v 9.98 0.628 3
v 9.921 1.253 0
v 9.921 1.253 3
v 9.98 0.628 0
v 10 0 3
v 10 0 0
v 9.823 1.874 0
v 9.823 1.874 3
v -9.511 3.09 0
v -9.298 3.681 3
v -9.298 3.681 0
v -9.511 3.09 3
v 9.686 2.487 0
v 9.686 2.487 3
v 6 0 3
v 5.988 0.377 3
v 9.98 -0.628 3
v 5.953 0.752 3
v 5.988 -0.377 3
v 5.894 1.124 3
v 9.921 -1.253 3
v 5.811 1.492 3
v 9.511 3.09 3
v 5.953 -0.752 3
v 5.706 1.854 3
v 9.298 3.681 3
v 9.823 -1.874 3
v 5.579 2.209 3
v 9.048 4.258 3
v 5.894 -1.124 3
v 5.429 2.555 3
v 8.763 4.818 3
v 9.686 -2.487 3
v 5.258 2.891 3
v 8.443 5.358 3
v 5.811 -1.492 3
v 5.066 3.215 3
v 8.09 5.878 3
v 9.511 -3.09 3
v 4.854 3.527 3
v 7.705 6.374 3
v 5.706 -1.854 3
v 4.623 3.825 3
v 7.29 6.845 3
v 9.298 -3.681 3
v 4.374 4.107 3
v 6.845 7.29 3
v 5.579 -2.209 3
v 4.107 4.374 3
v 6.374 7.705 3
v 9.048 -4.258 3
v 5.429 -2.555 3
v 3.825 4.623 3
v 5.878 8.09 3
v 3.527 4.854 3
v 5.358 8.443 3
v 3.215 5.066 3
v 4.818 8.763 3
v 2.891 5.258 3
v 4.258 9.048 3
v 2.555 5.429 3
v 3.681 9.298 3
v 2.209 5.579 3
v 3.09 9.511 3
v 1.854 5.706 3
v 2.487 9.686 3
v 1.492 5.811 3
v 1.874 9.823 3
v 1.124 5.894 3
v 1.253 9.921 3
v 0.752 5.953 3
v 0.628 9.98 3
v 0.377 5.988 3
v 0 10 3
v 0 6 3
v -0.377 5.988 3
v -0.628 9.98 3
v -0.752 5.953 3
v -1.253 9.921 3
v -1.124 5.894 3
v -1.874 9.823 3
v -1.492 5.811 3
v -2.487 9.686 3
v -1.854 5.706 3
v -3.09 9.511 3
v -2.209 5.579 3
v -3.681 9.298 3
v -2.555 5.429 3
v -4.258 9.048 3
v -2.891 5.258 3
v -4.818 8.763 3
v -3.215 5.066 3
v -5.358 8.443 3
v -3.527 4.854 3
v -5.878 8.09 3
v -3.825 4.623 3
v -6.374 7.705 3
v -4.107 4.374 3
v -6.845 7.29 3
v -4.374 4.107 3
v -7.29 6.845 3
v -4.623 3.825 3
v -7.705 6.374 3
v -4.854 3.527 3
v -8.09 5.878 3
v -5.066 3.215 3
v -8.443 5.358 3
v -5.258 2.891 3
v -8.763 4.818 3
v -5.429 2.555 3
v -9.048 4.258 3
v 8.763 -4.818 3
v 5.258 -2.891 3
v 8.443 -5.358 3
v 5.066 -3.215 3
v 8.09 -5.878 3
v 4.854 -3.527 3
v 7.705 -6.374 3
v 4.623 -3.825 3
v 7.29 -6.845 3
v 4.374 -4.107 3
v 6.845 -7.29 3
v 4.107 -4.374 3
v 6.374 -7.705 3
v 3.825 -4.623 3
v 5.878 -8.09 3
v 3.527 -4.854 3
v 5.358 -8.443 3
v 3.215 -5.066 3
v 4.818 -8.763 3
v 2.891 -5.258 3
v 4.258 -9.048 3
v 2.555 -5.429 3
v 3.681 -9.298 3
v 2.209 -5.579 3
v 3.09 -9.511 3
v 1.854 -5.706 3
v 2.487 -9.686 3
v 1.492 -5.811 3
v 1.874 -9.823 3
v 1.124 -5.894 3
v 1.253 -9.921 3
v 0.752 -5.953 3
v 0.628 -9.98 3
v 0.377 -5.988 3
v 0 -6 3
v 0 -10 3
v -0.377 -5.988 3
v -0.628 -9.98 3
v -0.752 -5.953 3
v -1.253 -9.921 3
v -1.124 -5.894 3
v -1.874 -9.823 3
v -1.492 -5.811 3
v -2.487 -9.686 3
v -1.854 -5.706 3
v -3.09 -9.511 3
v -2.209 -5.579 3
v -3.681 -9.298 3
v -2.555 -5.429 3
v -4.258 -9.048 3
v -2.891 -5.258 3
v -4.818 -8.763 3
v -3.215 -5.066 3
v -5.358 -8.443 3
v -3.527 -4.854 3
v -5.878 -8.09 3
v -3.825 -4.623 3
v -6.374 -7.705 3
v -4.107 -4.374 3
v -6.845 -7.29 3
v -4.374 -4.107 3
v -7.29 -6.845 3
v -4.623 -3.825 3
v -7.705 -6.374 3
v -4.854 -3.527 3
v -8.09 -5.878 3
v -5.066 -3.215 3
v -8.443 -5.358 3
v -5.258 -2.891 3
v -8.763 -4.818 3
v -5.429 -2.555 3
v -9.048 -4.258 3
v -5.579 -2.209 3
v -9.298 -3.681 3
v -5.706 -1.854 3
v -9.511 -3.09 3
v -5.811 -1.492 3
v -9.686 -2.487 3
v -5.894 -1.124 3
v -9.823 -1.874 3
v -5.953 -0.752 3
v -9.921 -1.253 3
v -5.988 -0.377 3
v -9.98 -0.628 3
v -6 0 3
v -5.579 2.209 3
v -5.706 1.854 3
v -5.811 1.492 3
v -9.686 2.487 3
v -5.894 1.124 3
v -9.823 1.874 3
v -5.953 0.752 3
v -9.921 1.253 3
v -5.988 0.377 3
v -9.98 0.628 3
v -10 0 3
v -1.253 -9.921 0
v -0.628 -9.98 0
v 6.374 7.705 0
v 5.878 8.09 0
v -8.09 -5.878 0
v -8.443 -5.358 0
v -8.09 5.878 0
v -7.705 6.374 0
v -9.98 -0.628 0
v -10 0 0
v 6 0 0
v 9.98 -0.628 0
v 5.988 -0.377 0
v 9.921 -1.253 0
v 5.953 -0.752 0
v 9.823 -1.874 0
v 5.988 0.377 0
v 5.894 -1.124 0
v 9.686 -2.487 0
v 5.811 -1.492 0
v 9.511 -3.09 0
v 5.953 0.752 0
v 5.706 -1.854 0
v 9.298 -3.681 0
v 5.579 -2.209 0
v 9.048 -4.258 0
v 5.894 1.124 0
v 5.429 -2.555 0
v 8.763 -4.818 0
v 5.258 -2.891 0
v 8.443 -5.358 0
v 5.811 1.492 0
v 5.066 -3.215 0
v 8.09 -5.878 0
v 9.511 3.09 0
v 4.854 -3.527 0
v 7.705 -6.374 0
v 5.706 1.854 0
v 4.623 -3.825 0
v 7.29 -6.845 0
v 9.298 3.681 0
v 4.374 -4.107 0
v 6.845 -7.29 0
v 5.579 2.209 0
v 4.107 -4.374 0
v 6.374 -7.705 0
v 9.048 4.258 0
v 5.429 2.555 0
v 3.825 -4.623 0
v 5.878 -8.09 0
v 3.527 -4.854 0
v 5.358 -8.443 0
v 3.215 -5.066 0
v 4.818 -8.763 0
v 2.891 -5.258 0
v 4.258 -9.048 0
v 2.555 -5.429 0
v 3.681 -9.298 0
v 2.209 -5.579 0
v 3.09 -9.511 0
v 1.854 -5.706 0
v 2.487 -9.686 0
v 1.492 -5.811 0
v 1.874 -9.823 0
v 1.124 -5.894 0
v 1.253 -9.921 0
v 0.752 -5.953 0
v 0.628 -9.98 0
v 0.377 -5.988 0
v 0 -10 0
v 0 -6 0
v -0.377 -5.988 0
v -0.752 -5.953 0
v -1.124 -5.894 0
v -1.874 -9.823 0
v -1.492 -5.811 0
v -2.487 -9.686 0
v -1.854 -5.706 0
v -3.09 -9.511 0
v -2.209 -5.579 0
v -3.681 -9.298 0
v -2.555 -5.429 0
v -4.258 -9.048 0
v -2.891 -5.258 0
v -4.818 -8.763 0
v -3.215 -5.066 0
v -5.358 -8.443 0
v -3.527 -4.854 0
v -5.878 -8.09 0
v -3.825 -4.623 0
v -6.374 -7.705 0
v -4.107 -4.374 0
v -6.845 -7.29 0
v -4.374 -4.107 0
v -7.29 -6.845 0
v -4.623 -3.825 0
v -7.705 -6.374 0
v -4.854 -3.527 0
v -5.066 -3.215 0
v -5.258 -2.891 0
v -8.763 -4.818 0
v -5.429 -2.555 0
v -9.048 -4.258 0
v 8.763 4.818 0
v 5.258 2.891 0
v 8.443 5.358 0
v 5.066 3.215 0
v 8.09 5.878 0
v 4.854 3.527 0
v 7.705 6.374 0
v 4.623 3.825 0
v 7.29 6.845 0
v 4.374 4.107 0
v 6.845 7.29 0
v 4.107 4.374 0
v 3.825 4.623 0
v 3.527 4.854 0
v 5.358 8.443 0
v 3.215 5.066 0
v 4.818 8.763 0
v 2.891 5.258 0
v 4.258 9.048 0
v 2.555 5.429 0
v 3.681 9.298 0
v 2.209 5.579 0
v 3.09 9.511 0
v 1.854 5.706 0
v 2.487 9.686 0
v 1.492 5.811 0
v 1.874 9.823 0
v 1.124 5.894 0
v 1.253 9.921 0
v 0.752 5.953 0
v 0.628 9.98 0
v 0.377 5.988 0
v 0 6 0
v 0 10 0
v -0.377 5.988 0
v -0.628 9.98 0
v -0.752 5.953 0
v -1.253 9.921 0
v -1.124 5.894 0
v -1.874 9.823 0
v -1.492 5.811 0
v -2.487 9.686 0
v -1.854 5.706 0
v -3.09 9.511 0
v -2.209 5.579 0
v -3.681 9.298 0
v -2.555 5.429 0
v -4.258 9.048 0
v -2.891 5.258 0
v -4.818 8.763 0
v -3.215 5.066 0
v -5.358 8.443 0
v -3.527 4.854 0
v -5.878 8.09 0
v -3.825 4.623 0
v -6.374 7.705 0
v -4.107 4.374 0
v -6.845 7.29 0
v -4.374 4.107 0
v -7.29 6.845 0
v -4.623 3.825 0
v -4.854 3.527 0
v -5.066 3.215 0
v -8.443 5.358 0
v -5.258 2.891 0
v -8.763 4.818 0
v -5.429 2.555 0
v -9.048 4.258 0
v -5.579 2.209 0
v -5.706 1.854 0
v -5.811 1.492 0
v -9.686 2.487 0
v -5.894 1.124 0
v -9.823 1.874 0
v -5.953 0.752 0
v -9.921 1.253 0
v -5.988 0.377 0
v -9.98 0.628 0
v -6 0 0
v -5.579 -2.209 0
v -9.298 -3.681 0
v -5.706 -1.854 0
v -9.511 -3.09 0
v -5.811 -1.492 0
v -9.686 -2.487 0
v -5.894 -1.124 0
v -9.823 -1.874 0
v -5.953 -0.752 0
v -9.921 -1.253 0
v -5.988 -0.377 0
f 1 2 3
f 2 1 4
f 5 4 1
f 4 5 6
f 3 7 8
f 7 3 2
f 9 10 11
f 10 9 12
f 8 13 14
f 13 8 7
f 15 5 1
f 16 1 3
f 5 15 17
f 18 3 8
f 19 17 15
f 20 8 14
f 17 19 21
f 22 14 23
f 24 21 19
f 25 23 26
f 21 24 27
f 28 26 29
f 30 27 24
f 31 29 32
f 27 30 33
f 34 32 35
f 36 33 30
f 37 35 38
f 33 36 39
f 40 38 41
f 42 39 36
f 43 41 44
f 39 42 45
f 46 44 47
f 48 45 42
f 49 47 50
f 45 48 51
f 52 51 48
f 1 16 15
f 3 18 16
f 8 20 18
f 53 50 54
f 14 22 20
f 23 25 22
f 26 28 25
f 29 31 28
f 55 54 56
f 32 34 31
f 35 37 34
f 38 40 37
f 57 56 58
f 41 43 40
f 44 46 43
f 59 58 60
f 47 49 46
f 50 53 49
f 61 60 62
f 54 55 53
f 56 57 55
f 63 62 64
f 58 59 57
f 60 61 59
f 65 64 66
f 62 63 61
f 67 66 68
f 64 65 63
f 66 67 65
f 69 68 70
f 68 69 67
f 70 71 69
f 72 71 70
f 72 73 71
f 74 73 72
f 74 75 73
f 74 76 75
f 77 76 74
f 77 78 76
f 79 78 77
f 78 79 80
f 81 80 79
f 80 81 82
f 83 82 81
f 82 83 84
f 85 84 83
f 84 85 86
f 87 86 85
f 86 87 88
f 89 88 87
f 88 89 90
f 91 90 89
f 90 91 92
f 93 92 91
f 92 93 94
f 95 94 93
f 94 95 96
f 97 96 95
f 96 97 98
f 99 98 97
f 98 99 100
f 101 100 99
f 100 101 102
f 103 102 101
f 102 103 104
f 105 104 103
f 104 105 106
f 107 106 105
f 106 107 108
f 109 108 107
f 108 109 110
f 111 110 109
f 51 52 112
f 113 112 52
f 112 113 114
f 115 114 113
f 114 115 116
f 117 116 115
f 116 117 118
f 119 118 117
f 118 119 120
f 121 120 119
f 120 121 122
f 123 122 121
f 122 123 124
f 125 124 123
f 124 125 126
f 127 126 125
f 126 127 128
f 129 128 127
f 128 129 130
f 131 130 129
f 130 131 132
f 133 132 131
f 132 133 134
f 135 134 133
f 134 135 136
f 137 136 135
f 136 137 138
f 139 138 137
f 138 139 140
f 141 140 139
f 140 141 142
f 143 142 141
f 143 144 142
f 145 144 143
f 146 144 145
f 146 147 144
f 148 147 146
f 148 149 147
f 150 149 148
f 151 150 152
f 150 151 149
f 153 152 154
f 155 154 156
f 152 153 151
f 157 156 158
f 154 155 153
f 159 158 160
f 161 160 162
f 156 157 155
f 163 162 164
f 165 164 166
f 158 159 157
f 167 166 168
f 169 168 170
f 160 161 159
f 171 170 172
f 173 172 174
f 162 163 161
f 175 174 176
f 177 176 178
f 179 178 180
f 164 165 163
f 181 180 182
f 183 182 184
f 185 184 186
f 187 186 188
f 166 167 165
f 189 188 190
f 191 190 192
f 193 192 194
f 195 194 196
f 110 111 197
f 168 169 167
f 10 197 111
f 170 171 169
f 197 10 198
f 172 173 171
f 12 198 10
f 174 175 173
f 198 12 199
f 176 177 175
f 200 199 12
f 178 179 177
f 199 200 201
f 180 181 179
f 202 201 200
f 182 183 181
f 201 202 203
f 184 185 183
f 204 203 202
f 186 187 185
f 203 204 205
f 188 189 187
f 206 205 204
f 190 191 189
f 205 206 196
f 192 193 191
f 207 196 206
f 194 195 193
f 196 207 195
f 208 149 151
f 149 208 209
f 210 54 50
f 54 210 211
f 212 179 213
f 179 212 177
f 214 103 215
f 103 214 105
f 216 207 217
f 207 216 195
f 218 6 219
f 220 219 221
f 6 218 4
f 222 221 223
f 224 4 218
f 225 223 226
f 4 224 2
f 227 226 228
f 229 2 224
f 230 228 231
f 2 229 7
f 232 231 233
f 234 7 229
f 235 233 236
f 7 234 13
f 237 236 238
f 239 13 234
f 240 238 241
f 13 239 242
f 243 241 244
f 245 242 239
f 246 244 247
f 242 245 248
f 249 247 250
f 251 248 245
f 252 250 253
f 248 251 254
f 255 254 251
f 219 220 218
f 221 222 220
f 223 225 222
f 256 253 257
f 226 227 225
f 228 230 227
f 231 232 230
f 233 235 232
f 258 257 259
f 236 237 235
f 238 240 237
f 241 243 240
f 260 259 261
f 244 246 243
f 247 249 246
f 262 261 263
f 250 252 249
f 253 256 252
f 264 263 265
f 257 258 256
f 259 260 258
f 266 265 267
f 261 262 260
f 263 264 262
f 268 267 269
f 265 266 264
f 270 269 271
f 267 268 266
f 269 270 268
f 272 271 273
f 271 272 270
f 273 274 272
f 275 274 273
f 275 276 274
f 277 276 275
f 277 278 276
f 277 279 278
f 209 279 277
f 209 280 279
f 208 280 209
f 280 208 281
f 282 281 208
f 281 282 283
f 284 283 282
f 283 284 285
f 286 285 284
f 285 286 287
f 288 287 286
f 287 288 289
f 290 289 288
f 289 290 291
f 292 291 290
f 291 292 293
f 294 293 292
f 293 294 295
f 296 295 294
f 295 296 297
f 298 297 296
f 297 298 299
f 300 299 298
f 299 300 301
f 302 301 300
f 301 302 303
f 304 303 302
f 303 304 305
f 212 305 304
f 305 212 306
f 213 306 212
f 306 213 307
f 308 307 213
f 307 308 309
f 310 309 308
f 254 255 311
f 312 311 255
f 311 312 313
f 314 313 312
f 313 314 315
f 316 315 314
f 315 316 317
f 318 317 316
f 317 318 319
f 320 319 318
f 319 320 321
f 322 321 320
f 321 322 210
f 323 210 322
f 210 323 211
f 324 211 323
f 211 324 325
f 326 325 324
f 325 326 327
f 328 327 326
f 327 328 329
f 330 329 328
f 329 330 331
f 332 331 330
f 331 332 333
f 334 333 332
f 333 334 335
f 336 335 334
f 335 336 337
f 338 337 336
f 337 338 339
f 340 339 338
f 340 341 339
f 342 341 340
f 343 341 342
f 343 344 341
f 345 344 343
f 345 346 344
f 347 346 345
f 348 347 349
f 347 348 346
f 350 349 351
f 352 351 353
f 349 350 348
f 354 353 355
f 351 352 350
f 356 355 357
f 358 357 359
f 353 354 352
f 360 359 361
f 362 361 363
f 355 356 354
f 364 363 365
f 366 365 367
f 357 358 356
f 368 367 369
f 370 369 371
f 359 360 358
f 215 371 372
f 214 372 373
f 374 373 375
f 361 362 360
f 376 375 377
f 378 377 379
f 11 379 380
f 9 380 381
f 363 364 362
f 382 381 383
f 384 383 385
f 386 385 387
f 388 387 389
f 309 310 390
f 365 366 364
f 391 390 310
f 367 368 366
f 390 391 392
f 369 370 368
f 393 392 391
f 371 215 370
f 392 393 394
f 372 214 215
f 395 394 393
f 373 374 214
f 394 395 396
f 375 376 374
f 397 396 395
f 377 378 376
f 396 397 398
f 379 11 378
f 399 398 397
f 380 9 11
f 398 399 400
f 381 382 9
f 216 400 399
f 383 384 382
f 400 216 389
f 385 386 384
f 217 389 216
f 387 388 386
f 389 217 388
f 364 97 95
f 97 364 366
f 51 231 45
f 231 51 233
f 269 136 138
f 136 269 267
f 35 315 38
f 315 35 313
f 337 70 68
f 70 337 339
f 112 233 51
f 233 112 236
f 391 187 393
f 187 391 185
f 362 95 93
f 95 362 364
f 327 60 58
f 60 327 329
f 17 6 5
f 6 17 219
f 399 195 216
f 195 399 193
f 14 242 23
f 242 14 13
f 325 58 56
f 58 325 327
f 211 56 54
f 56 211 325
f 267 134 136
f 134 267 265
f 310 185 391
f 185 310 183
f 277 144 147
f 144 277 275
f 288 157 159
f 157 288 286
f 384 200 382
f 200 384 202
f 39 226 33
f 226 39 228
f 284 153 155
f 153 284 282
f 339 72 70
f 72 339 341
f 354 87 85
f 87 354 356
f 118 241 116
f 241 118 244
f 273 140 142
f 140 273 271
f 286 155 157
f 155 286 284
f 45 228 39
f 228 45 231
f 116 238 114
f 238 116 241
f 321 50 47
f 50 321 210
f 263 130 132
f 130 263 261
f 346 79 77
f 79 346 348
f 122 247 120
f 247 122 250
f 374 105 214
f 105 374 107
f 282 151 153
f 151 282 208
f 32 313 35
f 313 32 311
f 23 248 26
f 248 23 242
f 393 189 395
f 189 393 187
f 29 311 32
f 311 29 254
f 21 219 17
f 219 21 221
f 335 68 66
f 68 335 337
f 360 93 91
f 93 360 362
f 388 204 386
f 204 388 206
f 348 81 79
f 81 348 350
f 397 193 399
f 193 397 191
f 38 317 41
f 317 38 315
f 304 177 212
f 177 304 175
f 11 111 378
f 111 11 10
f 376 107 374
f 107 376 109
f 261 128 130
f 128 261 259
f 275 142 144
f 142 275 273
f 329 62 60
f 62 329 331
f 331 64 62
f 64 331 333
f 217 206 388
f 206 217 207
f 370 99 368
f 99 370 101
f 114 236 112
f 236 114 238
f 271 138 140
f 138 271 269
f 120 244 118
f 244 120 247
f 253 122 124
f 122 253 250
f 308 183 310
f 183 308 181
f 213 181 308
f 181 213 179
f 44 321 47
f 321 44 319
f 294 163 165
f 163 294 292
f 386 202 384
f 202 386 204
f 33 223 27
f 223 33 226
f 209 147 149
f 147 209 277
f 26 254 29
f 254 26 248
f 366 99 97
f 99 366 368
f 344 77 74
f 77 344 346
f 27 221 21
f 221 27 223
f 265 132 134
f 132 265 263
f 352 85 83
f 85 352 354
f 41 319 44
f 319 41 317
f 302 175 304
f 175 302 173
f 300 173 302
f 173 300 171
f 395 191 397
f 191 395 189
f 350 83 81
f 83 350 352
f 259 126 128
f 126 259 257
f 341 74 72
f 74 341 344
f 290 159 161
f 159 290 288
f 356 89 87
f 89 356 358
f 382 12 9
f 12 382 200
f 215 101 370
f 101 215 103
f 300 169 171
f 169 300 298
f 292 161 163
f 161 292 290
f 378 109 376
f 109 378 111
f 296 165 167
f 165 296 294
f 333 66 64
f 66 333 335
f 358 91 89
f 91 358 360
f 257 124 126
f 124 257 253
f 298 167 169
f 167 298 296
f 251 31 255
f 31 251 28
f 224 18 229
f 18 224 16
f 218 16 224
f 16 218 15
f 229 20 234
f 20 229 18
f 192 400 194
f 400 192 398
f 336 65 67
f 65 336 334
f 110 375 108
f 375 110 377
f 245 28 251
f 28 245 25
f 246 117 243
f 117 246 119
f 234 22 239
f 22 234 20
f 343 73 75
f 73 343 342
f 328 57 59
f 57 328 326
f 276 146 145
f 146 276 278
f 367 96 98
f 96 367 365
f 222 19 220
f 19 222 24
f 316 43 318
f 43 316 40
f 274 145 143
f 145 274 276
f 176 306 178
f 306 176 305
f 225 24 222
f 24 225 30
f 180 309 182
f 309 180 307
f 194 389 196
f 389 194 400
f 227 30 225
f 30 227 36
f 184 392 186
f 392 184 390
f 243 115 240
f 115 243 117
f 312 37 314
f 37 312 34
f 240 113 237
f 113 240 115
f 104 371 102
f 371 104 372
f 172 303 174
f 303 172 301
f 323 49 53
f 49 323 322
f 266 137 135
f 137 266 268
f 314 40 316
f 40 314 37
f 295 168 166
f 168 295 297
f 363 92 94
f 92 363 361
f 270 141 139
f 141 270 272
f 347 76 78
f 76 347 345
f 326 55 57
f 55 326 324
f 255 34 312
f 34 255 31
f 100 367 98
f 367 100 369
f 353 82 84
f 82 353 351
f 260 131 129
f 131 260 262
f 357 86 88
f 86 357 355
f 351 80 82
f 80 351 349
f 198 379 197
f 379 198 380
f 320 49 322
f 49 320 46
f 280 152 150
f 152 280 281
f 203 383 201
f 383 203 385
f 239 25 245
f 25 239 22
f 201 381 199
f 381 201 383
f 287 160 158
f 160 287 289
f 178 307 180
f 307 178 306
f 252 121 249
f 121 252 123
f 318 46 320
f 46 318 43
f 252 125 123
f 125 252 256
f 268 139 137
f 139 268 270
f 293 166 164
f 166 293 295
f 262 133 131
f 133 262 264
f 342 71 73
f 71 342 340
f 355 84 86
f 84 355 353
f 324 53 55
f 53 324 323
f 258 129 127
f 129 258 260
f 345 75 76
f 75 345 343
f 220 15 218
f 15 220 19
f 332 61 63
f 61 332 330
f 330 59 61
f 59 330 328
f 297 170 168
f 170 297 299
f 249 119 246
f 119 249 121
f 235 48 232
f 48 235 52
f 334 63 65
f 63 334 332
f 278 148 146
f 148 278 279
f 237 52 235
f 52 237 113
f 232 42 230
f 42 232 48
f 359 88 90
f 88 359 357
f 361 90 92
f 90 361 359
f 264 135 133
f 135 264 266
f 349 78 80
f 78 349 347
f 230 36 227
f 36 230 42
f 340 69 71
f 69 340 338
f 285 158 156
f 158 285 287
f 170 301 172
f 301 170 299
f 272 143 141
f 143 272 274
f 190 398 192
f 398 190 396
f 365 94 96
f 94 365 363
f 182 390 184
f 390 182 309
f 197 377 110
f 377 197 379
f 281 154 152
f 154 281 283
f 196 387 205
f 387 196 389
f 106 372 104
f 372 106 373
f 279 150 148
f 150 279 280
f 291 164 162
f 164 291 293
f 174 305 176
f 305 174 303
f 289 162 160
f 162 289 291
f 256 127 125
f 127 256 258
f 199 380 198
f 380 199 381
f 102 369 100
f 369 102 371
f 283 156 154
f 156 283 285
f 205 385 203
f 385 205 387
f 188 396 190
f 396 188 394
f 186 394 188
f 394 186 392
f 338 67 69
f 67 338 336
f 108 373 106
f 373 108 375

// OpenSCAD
$fn=100;
outer=20;
inner=12;
height=3;

difference() {
  cylinder(h=height,d=outer);
  cylinder(h=height,d=inner);
}
